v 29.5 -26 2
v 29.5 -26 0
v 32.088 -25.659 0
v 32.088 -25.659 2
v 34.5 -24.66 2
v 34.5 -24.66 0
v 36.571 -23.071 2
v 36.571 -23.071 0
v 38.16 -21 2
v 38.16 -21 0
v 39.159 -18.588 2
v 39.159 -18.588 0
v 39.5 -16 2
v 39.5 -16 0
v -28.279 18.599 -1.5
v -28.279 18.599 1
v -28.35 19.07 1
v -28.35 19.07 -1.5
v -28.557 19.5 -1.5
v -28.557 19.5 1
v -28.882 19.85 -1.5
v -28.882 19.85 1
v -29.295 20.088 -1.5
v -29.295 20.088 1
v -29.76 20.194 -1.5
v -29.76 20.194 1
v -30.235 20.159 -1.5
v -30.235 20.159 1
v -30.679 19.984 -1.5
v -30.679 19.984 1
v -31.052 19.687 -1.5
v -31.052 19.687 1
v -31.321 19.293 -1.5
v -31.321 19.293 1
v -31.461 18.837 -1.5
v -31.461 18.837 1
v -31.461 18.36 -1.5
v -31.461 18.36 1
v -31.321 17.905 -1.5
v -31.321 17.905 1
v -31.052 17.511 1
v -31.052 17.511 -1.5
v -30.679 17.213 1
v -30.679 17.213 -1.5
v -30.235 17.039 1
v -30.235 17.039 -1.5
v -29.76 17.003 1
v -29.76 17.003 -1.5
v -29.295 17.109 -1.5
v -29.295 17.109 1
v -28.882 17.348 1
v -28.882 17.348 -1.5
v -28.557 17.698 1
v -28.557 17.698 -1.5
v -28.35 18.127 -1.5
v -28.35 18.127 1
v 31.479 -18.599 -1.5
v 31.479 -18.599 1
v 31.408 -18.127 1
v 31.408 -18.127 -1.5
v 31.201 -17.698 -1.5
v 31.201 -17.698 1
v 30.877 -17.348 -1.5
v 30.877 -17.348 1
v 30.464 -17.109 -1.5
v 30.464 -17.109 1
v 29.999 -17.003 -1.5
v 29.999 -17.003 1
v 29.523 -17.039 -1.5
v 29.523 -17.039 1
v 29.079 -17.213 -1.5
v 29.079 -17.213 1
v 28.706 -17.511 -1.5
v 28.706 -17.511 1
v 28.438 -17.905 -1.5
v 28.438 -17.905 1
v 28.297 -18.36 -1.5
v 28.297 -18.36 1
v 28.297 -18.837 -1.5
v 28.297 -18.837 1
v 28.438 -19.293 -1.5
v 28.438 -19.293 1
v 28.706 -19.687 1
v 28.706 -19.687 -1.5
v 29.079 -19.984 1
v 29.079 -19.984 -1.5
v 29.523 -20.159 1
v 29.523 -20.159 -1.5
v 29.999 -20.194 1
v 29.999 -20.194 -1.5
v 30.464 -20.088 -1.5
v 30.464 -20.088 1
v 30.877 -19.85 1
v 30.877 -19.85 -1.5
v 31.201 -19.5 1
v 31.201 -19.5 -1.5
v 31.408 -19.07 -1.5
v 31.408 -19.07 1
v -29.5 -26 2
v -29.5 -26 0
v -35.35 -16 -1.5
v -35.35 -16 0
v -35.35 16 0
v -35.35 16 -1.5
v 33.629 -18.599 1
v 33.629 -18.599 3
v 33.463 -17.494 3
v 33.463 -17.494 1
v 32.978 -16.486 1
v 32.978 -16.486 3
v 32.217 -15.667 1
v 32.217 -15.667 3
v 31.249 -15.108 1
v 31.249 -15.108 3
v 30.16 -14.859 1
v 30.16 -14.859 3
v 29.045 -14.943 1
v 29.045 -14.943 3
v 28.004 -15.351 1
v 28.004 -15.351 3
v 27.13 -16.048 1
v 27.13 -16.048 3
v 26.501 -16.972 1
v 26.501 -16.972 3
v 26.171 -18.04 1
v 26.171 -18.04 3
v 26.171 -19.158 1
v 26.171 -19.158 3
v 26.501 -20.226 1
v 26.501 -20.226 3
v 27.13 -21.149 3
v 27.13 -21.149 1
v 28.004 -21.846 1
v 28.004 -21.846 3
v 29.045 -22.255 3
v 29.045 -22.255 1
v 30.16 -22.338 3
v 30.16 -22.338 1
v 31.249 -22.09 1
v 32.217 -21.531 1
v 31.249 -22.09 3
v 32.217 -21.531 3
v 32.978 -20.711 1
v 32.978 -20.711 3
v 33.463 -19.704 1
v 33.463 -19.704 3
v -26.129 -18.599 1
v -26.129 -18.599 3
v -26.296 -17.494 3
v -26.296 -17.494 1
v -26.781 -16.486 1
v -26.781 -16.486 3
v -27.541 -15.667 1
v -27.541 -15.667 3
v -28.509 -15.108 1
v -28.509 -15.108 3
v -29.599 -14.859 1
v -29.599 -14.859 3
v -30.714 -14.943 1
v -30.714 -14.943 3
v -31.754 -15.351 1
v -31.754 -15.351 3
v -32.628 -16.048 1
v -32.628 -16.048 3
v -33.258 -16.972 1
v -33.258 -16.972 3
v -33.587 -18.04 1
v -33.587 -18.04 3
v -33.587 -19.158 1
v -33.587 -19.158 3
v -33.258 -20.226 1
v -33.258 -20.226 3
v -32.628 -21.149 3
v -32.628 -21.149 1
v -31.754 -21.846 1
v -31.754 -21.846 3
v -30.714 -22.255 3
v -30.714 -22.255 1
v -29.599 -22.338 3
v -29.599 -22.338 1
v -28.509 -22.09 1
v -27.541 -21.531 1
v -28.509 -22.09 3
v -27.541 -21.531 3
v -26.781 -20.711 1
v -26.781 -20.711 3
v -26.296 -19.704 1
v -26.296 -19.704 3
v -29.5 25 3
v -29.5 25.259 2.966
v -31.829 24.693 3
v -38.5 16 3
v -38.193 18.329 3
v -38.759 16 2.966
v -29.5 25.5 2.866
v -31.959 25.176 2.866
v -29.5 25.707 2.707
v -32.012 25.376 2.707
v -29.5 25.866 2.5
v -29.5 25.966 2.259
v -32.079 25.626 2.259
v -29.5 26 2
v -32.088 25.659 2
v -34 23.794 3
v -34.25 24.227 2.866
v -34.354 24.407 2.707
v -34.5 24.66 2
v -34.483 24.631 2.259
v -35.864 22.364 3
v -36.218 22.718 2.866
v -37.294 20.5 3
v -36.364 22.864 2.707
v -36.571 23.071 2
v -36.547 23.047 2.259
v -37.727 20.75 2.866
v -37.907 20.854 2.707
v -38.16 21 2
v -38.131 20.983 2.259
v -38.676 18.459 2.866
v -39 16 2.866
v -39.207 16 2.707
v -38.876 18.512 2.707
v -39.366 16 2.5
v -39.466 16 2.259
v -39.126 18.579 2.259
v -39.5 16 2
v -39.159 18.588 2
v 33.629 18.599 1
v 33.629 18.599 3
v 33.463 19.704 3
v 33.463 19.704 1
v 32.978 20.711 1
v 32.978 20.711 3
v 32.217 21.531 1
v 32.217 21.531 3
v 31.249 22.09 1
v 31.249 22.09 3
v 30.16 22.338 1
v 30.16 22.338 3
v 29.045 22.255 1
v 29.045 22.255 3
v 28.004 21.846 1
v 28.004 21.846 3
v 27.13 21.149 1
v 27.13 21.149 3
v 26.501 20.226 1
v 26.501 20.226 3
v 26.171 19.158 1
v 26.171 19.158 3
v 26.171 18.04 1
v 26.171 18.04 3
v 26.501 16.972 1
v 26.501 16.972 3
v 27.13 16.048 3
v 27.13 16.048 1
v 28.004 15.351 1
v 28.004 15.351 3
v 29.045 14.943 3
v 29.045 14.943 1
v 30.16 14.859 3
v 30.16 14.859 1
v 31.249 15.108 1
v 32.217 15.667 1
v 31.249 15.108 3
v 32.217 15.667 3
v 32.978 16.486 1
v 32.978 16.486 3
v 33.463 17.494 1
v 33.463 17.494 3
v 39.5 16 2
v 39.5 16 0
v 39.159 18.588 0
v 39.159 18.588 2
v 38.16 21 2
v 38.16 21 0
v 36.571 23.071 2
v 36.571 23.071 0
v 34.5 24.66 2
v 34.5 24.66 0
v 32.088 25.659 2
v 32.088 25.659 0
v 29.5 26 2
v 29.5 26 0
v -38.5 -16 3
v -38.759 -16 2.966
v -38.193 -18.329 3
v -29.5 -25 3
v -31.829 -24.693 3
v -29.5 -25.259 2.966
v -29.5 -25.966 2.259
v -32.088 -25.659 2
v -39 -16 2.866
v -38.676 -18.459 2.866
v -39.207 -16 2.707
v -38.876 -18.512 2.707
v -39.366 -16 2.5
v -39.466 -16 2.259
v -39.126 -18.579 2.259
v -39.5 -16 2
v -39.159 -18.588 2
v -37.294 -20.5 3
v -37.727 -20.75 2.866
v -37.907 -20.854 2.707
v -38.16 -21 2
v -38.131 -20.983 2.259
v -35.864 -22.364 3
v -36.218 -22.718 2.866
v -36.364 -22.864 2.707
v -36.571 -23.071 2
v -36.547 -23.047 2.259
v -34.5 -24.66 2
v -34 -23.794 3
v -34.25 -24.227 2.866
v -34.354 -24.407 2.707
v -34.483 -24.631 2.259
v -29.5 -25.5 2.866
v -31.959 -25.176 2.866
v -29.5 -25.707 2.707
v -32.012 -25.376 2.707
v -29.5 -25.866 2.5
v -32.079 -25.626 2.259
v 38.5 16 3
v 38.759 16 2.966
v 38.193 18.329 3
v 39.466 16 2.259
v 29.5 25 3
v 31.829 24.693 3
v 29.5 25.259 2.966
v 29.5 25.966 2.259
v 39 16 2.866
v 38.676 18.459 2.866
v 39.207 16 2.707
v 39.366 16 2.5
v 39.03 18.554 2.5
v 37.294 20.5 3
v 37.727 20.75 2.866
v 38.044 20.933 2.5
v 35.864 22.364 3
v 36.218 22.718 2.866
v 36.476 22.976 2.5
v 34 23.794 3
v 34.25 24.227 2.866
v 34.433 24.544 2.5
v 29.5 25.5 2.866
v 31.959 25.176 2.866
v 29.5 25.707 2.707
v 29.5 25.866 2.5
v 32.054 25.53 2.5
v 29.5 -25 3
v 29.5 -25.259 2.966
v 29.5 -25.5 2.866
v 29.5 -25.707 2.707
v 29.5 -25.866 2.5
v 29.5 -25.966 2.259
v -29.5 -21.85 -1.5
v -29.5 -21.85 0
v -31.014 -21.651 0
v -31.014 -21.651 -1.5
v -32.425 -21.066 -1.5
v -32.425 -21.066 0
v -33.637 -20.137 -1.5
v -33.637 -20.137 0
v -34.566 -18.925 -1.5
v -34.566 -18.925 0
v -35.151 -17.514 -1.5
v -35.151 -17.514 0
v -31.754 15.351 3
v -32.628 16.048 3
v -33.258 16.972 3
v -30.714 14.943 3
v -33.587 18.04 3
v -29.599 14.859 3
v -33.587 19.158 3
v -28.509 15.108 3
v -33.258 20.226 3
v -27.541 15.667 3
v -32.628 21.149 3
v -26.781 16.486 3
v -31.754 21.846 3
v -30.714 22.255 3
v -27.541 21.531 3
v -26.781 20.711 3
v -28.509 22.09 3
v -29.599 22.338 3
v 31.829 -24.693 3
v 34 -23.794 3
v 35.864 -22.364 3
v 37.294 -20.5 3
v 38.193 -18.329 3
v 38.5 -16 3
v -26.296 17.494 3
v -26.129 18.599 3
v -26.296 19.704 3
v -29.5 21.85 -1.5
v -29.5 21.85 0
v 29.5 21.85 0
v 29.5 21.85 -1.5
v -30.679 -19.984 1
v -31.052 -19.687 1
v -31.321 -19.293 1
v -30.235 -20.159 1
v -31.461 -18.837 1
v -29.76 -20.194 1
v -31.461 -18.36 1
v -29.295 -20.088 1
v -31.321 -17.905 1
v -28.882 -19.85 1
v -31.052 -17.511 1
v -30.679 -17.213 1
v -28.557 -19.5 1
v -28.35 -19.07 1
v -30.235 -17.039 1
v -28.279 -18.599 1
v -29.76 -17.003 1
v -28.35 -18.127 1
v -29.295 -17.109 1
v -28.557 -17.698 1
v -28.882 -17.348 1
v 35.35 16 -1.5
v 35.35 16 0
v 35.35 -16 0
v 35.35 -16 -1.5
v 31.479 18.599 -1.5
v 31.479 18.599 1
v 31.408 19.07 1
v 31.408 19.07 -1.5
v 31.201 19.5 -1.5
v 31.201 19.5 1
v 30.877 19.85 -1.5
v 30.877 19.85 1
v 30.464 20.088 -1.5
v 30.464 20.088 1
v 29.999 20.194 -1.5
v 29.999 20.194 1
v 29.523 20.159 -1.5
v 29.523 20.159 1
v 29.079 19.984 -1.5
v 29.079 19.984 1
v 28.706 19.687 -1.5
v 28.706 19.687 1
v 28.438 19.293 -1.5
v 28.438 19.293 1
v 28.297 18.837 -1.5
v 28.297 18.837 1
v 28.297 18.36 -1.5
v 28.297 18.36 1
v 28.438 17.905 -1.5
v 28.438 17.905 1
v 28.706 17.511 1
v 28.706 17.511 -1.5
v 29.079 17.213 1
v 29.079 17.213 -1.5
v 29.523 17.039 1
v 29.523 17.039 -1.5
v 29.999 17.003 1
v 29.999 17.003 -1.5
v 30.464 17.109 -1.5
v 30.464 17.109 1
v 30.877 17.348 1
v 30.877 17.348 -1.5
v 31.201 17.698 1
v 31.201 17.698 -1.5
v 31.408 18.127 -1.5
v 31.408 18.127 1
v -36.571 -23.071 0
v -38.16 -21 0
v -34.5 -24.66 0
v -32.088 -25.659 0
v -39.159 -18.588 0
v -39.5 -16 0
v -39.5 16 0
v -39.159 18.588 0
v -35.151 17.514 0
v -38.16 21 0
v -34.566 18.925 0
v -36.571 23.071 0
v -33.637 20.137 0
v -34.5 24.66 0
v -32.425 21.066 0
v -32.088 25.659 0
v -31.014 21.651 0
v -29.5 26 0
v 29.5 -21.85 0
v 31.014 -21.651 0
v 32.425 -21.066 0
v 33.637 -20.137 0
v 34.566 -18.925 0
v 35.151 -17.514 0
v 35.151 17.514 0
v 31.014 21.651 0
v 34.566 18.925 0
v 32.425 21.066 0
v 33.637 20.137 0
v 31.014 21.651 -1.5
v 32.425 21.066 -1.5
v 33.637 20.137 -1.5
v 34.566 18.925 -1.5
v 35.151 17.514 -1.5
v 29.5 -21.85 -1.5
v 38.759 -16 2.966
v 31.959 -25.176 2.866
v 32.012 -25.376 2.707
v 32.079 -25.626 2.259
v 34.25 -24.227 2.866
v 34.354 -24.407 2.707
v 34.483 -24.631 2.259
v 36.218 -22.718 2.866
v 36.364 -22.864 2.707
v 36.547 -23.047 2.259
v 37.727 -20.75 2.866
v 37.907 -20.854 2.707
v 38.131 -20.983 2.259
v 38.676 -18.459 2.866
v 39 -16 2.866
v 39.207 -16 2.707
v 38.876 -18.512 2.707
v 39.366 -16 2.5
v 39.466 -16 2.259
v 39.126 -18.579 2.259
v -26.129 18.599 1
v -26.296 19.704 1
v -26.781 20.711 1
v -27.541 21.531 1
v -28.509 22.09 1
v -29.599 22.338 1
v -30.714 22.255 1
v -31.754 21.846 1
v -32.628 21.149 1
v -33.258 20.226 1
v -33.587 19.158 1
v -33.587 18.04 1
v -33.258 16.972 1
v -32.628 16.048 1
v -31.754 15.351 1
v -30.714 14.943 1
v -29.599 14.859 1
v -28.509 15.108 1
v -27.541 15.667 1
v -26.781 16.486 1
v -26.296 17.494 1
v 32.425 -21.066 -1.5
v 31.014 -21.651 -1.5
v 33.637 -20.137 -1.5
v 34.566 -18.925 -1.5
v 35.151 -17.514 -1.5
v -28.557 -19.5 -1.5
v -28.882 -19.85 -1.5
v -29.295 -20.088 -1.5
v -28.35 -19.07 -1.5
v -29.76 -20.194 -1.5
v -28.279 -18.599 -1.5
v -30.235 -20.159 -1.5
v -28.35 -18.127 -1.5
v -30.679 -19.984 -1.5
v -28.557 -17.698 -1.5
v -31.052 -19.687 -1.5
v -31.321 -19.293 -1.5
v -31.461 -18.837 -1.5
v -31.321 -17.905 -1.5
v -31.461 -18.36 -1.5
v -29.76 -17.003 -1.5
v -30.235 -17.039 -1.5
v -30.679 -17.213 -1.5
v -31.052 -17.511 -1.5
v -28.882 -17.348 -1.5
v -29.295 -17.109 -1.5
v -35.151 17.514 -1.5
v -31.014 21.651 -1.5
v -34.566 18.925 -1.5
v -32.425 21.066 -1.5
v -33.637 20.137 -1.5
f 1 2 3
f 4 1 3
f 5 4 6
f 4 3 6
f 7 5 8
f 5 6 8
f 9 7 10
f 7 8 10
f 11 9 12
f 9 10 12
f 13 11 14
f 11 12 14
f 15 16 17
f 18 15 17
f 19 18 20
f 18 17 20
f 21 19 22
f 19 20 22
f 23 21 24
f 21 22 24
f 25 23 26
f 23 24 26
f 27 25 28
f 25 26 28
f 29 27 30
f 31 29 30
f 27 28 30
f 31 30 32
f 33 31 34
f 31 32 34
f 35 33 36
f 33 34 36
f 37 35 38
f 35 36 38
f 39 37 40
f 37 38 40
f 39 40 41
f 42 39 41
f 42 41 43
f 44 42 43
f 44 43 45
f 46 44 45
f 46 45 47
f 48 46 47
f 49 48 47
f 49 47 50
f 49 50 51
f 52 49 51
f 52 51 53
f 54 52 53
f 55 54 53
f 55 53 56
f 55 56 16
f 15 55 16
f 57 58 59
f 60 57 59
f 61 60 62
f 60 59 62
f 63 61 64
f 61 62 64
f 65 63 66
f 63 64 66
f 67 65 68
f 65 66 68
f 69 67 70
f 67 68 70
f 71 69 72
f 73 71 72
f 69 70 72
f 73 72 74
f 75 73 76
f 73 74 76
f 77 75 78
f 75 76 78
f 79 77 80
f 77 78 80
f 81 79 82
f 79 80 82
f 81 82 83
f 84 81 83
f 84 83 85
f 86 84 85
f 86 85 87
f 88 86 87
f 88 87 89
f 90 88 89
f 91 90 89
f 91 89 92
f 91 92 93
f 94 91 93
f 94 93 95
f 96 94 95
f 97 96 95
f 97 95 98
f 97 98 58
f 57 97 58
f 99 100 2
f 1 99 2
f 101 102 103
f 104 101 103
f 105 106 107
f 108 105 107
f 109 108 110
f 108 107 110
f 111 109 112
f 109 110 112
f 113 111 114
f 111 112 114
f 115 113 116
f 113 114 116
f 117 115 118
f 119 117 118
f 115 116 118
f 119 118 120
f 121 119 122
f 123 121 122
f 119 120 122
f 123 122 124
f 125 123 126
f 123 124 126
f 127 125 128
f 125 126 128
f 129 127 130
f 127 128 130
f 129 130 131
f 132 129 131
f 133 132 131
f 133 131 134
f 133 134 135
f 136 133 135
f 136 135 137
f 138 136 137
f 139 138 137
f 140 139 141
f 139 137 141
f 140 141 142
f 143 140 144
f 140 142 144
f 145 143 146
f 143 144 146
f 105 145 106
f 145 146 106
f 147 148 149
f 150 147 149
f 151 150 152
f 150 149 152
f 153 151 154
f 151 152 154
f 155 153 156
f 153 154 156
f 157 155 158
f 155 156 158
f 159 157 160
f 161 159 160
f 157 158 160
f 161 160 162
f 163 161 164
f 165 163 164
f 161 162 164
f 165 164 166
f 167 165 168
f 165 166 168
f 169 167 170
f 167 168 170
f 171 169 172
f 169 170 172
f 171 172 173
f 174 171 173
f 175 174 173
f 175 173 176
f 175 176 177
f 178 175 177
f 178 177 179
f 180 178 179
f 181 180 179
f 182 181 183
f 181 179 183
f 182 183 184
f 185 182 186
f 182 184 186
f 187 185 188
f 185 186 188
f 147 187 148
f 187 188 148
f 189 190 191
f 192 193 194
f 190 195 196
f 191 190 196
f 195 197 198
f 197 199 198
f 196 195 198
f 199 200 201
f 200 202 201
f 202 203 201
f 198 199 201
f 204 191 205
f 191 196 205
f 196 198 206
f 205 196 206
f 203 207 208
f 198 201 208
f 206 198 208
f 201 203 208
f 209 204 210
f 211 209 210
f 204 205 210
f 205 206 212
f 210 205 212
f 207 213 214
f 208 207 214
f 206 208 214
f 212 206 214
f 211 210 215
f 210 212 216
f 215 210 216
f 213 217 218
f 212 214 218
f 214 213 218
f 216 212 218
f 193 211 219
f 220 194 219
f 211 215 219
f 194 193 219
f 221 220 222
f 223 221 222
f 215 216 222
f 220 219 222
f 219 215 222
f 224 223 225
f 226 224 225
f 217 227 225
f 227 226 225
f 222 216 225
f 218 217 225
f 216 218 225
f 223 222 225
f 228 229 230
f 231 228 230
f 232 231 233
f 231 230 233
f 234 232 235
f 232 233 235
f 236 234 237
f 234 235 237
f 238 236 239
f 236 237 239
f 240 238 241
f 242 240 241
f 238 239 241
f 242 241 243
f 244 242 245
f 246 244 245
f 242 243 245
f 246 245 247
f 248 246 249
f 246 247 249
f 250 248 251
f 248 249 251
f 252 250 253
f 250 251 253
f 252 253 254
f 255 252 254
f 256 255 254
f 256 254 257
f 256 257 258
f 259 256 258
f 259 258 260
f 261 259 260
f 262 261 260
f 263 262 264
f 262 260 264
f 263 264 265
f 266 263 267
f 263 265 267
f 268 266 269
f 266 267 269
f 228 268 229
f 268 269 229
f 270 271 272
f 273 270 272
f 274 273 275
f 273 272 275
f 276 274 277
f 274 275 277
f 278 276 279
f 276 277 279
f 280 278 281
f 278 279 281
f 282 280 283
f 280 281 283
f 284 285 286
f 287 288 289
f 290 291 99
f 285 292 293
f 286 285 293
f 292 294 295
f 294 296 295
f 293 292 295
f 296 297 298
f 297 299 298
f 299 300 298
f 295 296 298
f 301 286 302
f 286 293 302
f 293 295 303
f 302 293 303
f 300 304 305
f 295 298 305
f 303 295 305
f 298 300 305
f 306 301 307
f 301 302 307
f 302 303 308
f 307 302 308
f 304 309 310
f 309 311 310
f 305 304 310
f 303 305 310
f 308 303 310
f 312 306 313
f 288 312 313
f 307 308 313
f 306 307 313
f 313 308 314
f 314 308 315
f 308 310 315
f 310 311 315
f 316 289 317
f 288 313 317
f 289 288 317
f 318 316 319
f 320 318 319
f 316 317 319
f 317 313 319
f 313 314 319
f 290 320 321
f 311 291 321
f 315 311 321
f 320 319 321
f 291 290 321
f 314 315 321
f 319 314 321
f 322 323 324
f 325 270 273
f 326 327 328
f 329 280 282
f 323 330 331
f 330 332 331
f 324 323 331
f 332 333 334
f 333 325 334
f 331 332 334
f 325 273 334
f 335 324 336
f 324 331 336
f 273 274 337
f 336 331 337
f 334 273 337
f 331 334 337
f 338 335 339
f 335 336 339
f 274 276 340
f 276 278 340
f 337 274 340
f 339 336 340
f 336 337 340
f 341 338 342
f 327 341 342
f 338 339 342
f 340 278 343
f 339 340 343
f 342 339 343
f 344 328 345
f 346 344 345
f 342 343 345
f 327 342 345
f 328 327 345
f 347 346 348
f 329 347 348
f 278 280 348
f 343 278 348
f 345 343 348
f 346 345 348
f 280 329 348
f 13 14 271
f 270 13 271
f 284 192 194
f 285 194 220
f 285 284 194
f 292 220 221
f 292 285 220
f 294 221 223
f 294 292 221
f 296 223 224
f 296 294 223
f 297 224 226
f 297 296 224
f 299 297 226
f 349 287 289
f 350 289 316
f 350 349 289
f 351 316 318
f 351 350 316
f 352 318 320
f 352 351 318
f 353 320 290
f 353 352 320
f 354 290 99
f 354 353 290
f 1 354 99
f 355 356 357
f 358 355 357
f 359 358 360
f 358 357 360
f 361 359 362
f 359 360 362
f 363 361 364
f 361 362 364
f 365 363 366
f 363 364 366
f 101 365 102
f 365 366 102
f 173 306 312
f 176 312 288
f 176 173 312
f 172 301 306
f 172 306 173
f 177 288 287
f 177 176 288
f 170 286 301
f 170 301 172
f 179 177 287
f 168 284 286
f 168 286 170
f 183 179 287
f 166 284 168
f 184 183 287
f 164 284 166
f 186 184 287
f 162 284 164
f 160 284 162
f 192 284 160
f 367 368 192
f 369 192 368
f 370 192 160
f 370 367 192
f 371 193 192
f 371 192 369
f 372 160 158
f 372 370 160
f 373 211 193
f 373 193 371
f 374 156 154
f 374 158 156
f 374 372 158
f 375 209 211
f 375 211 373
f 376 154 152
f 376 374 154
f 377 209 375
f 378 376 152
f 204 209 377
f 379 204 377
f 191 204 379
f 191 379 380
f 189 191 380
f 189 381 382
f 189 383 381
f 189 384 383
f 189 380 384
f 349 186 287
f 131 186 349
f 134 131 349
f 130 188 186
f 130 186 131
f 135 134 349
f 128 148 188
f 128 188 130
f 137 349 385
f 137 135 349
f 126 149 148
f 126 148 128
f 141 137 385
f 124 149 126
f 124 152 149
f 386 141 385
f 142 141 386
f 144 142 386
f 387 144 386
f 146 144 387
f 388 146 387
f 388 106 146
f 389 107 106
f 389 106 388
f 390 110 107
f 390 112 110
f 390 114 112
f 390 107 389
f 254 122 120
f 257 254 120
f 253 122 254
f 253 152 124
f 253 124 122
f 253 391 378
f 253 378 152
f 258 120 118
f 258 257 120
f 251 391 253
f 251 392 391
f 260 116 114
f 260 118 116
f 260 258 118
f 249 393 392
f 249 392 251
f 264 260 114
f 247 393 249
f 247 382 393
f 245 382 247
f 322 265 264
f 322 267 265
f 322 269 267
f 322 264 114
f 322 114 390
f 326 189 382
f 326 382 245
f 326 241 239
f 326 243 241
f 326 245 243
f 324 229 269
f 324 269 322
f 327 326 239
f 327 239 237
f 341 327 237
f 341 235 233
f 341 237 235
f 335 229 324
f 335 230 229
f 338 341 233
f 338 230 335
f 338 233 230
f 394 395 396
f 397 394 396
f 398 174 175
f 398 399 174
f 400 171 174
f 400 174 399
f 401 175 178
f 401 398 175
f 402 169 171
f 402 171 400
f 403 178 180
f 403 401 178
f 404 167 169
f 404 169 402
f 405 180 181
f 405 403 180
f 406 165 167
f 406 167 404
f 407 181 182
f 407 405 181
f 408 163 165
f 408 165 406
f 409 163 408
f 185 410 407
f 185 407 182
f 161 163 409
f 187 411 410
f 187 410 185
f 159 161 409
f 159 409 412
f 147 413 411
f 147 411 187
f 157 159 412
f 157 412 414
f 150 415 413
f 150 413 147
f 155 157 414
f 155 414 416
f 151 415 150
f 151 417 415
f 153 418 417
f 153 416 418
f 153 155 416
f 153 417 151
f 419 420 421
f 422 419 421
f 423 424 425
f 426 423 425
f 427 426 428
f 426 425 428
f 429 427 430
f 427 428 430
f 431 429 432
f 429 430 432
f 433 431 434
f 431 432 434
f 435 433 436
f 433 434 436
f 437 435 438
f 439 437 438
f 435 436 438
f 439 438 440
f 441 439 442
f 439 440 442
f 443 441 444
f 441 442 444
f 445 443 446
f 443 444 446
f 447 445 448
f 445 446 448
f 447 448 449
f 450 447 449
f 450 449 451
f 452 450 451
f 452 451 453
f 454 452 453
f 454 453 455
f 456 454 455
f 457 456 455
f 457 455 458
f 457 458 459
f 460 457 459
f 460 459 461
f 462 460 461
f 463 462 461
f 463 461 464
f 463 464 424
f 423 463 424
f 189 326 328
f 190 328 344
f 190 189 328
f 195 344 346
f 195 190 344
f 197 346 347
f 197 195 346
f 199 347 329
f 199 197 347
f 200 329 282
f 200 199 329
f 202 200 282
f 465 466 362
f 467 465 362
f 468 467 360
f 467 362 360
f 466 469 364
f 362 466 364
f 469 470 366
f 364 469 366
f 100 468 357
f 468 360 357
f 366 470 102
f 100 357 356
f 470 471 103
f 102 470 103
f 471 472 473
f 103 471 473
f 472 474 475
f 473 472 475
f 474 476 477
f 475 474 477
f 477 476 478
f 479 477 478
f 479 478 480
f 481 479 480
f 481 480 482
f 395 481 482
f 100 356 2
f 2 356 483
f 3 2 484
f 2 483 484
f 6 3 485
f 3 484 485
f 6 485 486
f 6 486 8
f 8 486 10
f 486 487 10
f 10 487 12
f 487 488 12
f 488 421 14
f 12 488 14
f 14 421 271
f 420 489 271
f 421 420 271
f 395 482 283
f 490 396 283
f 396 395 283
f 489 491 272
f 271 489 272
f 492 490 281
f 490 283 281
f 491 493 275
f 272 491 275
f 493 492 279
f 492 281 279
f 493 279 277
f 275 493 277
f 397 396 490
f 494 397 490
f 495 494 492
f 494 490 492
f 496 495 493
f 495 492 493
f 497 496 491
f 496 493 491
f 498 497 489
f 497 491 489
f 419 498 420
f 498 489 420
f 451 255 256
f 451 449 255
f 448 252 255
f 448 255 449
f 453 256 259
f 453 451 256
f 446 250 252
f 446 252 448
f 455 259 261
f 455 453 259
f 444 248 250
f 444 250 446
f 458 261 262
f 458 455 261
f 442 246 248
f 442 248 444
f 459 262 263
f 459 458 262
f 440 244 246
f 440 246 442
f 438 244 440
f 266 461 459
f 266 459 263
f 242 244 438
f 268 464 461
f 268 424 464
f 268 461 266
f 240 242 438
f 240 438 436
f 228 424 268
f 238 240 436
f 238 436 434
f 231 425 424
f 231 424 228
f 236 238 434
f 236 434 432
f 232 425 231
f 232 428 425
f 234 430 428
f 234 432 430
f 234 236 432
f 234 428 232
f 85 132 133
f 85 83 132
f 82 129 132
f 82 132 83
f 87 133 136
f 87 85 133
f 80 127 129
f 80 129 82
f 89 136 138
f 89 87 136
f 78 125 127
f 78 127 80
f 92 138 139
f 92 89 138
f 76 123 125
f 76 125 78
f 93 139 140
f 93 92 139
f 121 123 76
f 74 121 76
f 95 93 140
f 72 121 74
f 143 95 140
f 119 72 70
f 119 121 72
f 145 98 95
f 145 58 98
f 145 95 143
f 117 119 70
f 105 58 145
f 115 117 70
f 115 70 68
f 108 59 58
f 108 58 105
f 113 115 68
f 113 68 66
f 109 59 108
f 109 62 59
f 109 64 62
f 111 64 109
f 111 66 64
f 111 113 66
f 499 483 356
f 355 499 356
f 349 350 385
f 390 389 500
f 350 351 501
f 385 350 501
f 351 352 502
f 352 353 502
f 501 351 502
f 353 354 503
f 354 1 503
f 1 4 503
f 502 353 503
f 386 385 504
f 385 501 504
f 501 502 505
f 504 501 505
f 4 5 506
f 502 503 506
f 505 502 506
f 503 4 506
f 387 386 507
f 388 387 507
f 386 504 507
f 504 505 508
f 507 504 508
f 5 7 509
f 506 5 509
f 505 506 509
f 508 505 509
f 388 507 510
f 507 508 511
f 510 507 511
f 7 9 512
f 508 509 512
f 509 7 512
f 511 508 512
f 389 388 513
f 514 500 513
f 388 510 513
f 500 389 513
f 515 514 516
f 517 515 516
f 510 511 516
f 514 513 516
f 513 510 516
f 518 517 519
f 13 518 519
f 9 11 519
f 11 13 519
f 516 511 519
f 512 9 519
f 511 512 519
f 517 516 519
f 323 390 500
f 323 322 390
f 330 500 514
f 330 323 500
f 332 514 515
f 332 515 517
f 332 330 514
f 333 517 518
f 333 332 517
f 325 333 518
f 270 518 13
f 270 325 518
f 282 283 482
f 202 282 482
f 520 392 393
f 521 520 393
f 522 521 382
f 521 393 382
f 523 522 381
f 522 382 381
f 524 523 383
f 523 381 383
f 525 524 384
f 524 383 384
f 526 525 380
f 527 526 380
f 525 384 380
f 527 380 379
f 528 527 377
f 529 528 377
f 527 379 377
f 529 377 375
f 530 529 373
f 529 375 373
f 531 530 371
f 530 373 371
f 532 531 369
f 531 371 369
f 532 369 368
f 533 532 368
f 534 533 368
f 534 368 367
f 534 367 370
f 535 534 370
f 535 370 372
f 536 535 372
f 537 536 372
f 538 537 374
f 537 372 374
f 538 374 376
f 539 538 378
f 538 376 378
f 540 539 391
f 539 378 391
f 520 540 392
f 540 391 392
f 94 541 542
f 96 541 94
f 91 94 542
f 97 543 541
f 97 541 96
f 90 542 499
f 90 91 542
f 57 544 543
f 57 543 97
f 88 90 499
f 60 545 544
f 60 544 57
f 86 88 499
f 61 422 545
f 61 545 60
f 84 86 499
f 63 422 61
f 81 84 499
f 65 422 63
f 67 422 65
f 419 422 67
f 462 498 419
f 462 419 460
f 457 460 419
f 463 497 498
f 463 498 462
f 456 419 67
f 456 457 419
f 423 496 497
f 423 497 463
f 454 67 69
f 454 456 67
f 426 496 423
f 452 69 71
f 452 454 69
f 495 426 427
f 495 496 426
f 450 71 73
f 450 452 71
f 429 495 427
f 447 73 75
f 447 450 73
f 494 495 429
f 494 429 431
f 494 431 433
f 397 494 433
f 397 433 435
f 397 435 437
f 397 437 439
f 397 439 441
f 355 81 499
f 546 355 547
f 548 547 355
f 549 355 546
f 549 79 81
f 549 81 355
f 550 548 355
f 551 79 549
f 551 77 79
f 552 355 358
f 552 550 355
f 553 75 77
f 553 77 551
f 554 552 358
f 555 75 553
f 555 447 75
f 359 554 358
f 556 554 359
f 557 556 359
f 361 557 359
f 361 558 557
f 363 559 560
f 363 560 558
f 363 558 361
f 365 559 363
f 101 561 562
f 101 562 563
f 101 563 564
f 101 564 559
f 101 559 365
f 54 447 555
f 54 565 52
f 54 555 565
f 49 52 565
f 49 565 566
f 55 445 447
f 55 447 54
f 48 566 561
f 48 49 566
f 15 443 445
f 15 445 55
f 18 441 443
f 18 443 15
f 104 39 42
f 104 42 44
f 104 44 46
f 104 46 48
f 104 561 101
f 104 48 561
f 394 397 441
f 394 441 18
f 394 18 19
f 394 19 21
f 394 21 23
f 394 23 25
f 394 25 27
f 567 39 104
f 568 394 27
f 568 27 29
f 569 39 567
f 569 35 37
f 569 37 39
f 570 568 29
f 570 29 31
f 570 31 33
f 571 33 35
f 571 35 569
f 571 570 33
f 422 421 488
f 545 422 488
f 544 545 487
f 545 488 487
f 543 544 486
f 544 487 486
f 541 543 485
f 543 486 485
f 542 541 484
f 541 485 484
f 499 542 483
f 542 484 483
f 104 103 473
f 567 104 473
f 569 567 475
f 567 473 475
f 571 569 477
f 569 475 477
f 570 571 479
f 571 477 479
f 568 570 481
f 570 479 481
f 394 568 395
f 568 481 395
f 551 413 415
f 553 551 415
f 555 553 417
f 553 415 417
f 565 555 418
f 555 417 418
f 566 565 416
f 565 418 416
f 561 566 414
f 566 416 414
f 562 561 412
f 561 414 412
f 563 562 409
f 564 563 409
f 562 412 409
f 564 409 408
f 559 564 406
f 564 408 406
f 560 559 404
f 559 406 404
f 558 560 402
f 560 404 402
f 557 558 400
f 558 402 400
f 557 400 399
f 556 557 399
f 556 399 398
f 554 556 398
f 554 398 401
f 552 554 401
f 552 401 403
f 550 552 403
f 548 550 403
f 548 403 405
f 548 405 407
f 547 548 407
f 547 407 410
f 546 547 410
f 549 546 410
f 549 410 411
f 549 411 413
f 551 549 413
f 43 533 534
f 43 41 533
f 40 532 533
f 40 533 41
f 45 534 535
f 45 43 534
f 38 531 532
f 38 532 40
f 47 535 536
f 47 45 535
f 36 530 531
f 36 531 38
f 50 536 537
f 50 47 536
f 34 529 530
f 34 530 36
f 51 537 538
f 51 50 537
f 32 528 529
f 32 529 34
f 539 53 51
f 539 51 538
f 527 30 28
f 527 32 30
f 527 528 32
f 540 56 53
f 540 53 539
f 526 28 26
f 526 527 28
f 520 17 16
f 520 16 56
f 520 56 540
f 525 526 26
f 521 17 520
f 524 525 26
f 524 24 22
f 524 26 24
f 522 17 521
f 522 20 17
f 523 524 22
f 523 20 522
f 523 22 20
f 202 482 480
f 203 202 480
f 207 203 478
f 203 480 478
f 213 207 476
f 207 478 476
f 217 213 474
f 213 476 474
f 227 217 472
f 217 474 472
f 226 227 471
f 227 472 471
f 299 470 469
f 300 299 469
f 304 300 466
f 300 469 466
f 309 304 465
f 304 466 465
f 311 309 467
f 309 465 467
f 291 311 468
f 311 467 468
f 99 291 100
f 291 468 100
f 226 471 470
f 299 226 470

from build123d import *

# Parameters (mm, degrees)
Y_KSEKLIK_EKSTR_ZYON1_DEPTH = 3
Y_KSEKLIK_EKSTR_ZYON2_DEPTH = 1.5
RADYUS1_R                   = 1
IZIM5_R                     = 1.6
KES_EKSTR_ZYON1_DEPTH       = 5
IZIM6_R                     = 3.75
KES_EKSTR_ZYON2_DEPTH       = 2


with BuildPart() as part:
    # Çizim1 → Yükseklik-Ekstrüzyon1 (new body)
    with BuildSketch(Plane.XY):
        with BuildLine():
            Line((-29.5, -26), (29.5, -26))
            ThreePointArc((29.5, -26), (36.571067812, -23.071067812), (39.5, -16))
            Line((39.5, -16), (39.5, 16))
            ThreePointArc((39.5, 16), (36.571067812, 23.071067812), (29.5, 26))
            Line((29.5, 26), (-29.5, 26))
            ThreePointArc((-29.5, 26), (-36.571067812, 23.071067812), (-39.5, 16))
            Line((-39.5, 16), (-39.5, -16))
            ThreePointArc((-39.5, -16), (-36.571067812, -23.071067812), (-29.5, -26))
        make_face()
    extrude(amount=Y_KSEKLIK_EKSTR_ZYON1_DEPTH)

    # Çizim4 → Yükseklik-Ekstrüzyon2 (add)
    with BuildSketch(Plane(origin=(0, 0, 0), x_dir=(-1, 0, 0), z_dir=(0, 0, -1))):
        with BuildLine():
            Line((-35.35, 16), (-35.35, -16))
            ThreePointArc((-35.35, -16), (-33.63657467, -20.13657467), (-29.5, -21.85))
            Line((-29.5, -21.85), (29.5, -21.85))
            ThreePointArc((29.5, -21.85), (33.63657467, -20.13657467), (35.35, -16))
            Line((35.35, -16), (35.35, 16))
            ThreePointArc((35.35, 16), (33.63657467, 20.13657467), (29.5, 21.85))
            Line((29.5, 21.85), (-29.5, 21.85))
            ThreePointArc((-29.5, 21.85), (-33.63657467, 20.13657467), (-35.35, 16))
        make_face()
    extrude(amount=Y_KSEKLIK_EKSTR_ZYON2_DEPTH)

    # Radyus1
    radyus1_edges = [part.edges().sort_by_distance(p)[0] for p in [
        (36.571067812, 23.071067812, 3),
        (0, 26, 3),
        (-36.571067812, 23.071067812, 3),
        (-39.5, 0, 3),
        (-36.571067812, -23.071067812, 3),
        (0, -26, 3),
        (36.571067812, -23.071067812, 3),
        (39.5, 0, 3),
    ]]
    fillet(radyus1_edges, radius=RADYUS1_R)

    # Çizim5 → Kes-Ekstrüzyon1 (cut)
    with BuildSketch(Plane.XY.offset(3)):
        with Locations((29.879306909, -18.598843149)):
            Circle(IZIM5_R)
        with Locations((-29.879306909, -18.598843149)):
            Circle(IZIM5_R)
        with Locations((-29.879306909, 18.598843149)):
            Circle(IZIM5_R)
        with Locations((29.879306909, 18.598843149)):
            Circle(IZIM5_R)
    extrude(amount=-KES_EKSTR_ZYON1_DEPTH, mode=Mode.SUBTRACT)

    # Çizim6 → Kes-Ekstrüzyon2 (cut)
    with BuildSketch(Plane.XY.offset(3)):
        with Locations((29.879306909, -18.598843149)):
            Circle(IZIM6_R)
        with Locations((-29.879306909, -18.598843149)):
            Circle(IZIM6_R)
        with Locations((-29.879306909, 18.598843149)):
            Circle(IZIM6_R)
        with Locations((29.879306909, 18.598843149)):
            Circle(IZIM6_R)
    extrude(amount=-KES_EKSTR_ZYON2_DEPTH, mode=Mode.SUBTRACT)


solid = part.part
